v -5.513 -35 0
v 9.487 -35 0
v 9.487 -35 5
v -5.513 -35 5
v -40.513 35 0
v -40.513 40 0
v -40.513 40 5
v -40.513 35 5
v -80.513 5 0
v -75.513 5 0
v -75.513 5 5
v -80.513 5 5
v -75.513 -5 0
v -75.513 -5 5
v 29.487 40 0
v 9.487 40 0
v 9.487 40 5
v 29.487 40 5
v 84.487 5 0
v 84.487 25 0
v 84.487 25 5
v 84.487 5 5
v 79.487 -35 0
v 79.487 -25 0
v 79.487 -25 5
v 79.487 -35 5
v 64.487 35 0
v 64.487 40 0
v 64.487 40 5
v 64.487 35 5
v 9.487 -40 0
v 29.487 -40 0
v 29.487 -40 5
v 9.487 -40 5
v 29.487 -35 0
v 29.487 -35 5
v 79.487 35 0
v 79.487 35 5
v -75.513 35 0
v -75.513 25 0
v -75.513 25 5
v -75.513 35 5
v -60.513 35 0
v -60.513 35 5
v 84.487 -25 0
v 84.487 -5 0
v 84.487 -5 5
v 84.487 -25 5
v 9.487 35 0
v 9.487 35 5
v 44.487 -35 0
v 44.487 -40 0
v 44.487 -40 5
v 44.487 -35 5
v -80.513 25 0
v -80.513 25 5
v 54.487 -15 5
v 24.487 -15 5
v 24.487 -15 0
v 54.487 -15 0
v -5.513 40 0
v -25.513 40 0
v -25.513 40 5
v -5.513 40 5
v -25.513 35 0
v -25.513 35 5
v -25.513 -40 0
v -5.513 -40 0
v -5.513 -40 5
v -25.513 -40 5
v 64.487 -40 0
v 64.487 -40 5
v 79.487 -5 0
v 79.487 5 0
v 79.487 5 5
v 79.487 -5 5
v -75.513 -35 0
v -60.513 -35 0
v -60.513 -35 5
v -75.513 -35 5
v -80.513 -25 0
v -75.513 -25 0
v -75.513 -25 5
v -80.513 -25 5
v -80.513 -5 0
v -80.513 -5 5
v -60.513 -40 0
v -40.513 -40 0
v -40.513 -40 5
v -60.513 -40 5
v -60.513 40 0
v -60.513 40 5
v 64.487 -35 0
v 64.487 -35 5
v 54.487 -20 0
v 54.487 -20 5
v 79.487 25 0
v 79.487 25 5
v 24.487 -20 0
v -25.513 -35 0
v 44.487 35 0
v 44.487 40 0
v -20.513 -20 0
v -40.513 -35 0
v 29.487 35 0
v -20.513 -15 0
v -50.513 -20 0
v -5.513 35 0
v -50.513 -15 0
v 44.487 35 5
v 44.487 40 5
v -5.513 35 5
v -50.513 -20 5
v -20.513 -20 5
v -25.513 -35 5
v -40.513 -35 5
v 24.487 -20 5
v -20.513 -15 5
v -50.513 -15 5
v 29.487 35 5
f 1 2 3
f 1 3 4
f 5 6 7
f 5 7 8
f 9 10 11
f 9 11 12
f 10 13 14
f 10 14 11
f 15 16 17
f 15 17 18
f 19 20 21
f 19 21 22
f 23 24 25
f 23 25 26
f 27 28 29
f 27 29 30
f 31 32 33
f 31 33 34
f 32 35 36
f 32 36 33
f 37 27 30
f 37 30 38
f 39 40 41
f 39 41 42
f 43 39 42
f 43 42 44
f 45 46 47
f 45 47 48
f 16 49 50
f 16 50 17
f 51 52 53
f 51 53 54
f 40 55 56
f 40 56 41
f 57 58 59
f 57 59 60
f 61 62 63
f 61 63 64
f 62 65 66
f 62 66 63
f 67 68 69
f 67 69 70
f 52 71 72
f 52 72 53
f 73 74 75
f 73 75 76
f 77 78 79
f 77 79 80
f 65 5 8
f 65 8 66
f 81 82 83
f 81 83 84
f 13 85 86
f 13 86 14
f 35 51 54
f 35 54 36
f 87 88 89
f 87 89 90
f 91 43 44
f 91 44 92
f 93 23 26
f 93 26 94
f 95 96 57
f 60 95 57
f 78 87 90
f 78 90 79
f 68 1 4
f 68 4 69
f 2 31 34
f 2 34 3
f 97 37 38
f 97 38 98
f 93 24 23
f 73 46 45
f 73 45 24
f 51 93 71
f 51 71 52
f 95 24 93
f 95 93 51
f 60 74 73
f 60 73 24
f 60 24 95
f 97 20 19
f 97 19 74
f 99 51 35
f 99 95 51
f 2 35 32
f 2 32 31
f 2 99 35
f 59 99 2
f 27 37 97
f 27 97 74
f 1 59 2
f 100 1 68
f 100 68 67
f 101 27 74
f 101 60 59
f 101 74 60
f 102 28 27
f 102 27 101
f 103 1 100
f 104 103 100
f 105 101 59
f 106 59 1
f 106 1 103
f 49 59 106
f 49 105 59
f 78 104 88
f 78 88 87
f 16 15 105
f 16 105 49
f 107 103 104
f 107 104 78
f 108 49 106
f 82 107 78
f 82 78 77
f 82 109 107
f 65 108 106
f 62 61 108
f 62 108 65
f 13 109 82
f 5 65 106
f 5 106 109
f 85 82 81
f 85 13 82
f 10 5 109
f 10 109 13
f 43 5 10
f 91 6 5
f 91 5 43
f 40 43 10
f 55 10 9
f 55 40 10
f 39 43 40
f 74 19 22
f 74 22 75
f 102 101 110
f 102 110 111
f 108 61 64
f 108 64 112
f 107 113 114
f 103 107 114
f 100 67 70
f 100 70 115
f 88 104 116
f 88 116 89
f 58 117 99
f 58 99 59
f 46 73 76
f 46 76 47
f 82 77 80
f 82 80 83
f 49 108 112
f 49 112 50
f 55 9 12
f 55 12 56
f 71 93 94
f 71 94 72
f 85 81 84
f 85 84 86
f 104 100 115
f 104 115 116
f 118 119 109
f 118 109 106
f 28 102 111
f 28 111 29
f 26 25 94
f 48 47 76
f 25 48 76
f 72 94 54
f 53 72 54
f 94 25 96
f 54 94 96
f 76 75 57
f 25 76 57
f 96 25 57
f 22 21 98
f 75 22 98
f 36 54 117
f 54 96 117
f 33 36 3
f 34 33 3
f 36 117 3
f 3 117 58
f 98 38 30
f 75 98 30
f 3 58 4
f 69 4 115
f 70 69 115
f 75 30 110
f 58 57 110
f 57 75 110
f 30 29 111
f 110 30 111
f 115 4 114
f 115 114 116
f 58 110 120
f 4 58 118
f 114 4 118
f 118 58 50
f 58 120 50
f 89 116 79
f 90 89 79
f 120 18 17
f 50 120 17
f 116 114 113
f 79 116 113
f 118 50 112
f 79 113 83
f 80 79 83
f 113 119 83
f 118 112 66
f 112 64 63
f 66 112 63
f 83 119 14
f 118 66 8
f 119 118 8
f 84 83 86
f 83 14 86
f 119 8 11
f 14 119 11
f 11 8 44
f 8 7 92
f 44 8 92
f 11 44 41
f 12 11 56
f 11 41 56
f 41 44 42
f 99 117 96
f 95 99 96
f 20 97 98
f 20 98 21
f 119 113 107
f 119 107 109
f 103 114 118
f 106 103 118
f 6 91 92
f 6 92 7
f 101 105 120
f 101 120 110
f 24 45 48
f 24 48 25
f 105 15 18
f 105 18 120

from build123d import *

# Parameters (mm, degrees)
BOSS_EXTRUDE1_DEPTH = 5
SKETCH2_W           = 30
SKETCH2_H           = 5
CUT_EXTRUDE1_DEPTH  = 5


with BuildPart() as part:
    # Sketch1 → Boss-Extrude1 (new body)
    with BuildSketch(Plane.XY):
        Polygon((-75.513214474, 35), (-60.513214474, 35), (-60.513214474, 40), (-40.513214474, 40), (-40.513214474, 35), (-25.513214474, 35), (-25.513214474, 40), (-5.513214474, 40), (-5.513214474, 35), (9.486785526, 35), (9.486785526, 40), (29.486785526, 40), (29.486785526, 35), (44.486785526, 35), (44.486785526, 40), (64.486785526, 40), (64.486785526, 35), (79.486785526, 35), (79.486785526, 25), (84.486785526, 25), (84.486785526, 5), (79.486785526, 5), (79.486785526, -5), (84.486785526, -5), (84.486785526, -25), (79.486785526, -25), (79.486785526, -35), (64.486785526, -35), (64.486785526, -40), (44.486785526, -40), (44.486785526, -35), (29.486785526, -35), (29.486785526, -40), (9.486785526, -40), (9.486785526, -35), (-5.513214474, -35), (-5.513214474, -40), (-25.513214474, -40), (-25.513214474, -35), (-40.513214474, -35), (-40.513214474, -40), (-60.513214474, -40), (-60.513214474, -35), (-75.513214474, -35), (-75.513214474, -25), (-80.513214474, -25), (-80.513214474, -5), (-75.513214474, -5), (-75.513214474, 5), (-80.513214474, 5), (-80.513214474, 25), (-75.513214474, 25), align=None)
    extrude(amount=BOSS_EXTRUDE1_DEPTH)

    # Sketch2 → Cut-Extrude1 (cut)
    with BuildSketch(Plane.XY.offset(5)):
        with Locations((39.486785526, -17.5)):
            Rectangle(SKETCH2_W, SKETCH2_H)
        with Locations((-35.513214474, -17.5)):
            Rectangle(SKETCH2_W, SKETCH2_H)
    extrude(amount=-CUT_EXTRUDE1_DEPTH, mode=Mode.SUBTRACT)


solid = part.part
